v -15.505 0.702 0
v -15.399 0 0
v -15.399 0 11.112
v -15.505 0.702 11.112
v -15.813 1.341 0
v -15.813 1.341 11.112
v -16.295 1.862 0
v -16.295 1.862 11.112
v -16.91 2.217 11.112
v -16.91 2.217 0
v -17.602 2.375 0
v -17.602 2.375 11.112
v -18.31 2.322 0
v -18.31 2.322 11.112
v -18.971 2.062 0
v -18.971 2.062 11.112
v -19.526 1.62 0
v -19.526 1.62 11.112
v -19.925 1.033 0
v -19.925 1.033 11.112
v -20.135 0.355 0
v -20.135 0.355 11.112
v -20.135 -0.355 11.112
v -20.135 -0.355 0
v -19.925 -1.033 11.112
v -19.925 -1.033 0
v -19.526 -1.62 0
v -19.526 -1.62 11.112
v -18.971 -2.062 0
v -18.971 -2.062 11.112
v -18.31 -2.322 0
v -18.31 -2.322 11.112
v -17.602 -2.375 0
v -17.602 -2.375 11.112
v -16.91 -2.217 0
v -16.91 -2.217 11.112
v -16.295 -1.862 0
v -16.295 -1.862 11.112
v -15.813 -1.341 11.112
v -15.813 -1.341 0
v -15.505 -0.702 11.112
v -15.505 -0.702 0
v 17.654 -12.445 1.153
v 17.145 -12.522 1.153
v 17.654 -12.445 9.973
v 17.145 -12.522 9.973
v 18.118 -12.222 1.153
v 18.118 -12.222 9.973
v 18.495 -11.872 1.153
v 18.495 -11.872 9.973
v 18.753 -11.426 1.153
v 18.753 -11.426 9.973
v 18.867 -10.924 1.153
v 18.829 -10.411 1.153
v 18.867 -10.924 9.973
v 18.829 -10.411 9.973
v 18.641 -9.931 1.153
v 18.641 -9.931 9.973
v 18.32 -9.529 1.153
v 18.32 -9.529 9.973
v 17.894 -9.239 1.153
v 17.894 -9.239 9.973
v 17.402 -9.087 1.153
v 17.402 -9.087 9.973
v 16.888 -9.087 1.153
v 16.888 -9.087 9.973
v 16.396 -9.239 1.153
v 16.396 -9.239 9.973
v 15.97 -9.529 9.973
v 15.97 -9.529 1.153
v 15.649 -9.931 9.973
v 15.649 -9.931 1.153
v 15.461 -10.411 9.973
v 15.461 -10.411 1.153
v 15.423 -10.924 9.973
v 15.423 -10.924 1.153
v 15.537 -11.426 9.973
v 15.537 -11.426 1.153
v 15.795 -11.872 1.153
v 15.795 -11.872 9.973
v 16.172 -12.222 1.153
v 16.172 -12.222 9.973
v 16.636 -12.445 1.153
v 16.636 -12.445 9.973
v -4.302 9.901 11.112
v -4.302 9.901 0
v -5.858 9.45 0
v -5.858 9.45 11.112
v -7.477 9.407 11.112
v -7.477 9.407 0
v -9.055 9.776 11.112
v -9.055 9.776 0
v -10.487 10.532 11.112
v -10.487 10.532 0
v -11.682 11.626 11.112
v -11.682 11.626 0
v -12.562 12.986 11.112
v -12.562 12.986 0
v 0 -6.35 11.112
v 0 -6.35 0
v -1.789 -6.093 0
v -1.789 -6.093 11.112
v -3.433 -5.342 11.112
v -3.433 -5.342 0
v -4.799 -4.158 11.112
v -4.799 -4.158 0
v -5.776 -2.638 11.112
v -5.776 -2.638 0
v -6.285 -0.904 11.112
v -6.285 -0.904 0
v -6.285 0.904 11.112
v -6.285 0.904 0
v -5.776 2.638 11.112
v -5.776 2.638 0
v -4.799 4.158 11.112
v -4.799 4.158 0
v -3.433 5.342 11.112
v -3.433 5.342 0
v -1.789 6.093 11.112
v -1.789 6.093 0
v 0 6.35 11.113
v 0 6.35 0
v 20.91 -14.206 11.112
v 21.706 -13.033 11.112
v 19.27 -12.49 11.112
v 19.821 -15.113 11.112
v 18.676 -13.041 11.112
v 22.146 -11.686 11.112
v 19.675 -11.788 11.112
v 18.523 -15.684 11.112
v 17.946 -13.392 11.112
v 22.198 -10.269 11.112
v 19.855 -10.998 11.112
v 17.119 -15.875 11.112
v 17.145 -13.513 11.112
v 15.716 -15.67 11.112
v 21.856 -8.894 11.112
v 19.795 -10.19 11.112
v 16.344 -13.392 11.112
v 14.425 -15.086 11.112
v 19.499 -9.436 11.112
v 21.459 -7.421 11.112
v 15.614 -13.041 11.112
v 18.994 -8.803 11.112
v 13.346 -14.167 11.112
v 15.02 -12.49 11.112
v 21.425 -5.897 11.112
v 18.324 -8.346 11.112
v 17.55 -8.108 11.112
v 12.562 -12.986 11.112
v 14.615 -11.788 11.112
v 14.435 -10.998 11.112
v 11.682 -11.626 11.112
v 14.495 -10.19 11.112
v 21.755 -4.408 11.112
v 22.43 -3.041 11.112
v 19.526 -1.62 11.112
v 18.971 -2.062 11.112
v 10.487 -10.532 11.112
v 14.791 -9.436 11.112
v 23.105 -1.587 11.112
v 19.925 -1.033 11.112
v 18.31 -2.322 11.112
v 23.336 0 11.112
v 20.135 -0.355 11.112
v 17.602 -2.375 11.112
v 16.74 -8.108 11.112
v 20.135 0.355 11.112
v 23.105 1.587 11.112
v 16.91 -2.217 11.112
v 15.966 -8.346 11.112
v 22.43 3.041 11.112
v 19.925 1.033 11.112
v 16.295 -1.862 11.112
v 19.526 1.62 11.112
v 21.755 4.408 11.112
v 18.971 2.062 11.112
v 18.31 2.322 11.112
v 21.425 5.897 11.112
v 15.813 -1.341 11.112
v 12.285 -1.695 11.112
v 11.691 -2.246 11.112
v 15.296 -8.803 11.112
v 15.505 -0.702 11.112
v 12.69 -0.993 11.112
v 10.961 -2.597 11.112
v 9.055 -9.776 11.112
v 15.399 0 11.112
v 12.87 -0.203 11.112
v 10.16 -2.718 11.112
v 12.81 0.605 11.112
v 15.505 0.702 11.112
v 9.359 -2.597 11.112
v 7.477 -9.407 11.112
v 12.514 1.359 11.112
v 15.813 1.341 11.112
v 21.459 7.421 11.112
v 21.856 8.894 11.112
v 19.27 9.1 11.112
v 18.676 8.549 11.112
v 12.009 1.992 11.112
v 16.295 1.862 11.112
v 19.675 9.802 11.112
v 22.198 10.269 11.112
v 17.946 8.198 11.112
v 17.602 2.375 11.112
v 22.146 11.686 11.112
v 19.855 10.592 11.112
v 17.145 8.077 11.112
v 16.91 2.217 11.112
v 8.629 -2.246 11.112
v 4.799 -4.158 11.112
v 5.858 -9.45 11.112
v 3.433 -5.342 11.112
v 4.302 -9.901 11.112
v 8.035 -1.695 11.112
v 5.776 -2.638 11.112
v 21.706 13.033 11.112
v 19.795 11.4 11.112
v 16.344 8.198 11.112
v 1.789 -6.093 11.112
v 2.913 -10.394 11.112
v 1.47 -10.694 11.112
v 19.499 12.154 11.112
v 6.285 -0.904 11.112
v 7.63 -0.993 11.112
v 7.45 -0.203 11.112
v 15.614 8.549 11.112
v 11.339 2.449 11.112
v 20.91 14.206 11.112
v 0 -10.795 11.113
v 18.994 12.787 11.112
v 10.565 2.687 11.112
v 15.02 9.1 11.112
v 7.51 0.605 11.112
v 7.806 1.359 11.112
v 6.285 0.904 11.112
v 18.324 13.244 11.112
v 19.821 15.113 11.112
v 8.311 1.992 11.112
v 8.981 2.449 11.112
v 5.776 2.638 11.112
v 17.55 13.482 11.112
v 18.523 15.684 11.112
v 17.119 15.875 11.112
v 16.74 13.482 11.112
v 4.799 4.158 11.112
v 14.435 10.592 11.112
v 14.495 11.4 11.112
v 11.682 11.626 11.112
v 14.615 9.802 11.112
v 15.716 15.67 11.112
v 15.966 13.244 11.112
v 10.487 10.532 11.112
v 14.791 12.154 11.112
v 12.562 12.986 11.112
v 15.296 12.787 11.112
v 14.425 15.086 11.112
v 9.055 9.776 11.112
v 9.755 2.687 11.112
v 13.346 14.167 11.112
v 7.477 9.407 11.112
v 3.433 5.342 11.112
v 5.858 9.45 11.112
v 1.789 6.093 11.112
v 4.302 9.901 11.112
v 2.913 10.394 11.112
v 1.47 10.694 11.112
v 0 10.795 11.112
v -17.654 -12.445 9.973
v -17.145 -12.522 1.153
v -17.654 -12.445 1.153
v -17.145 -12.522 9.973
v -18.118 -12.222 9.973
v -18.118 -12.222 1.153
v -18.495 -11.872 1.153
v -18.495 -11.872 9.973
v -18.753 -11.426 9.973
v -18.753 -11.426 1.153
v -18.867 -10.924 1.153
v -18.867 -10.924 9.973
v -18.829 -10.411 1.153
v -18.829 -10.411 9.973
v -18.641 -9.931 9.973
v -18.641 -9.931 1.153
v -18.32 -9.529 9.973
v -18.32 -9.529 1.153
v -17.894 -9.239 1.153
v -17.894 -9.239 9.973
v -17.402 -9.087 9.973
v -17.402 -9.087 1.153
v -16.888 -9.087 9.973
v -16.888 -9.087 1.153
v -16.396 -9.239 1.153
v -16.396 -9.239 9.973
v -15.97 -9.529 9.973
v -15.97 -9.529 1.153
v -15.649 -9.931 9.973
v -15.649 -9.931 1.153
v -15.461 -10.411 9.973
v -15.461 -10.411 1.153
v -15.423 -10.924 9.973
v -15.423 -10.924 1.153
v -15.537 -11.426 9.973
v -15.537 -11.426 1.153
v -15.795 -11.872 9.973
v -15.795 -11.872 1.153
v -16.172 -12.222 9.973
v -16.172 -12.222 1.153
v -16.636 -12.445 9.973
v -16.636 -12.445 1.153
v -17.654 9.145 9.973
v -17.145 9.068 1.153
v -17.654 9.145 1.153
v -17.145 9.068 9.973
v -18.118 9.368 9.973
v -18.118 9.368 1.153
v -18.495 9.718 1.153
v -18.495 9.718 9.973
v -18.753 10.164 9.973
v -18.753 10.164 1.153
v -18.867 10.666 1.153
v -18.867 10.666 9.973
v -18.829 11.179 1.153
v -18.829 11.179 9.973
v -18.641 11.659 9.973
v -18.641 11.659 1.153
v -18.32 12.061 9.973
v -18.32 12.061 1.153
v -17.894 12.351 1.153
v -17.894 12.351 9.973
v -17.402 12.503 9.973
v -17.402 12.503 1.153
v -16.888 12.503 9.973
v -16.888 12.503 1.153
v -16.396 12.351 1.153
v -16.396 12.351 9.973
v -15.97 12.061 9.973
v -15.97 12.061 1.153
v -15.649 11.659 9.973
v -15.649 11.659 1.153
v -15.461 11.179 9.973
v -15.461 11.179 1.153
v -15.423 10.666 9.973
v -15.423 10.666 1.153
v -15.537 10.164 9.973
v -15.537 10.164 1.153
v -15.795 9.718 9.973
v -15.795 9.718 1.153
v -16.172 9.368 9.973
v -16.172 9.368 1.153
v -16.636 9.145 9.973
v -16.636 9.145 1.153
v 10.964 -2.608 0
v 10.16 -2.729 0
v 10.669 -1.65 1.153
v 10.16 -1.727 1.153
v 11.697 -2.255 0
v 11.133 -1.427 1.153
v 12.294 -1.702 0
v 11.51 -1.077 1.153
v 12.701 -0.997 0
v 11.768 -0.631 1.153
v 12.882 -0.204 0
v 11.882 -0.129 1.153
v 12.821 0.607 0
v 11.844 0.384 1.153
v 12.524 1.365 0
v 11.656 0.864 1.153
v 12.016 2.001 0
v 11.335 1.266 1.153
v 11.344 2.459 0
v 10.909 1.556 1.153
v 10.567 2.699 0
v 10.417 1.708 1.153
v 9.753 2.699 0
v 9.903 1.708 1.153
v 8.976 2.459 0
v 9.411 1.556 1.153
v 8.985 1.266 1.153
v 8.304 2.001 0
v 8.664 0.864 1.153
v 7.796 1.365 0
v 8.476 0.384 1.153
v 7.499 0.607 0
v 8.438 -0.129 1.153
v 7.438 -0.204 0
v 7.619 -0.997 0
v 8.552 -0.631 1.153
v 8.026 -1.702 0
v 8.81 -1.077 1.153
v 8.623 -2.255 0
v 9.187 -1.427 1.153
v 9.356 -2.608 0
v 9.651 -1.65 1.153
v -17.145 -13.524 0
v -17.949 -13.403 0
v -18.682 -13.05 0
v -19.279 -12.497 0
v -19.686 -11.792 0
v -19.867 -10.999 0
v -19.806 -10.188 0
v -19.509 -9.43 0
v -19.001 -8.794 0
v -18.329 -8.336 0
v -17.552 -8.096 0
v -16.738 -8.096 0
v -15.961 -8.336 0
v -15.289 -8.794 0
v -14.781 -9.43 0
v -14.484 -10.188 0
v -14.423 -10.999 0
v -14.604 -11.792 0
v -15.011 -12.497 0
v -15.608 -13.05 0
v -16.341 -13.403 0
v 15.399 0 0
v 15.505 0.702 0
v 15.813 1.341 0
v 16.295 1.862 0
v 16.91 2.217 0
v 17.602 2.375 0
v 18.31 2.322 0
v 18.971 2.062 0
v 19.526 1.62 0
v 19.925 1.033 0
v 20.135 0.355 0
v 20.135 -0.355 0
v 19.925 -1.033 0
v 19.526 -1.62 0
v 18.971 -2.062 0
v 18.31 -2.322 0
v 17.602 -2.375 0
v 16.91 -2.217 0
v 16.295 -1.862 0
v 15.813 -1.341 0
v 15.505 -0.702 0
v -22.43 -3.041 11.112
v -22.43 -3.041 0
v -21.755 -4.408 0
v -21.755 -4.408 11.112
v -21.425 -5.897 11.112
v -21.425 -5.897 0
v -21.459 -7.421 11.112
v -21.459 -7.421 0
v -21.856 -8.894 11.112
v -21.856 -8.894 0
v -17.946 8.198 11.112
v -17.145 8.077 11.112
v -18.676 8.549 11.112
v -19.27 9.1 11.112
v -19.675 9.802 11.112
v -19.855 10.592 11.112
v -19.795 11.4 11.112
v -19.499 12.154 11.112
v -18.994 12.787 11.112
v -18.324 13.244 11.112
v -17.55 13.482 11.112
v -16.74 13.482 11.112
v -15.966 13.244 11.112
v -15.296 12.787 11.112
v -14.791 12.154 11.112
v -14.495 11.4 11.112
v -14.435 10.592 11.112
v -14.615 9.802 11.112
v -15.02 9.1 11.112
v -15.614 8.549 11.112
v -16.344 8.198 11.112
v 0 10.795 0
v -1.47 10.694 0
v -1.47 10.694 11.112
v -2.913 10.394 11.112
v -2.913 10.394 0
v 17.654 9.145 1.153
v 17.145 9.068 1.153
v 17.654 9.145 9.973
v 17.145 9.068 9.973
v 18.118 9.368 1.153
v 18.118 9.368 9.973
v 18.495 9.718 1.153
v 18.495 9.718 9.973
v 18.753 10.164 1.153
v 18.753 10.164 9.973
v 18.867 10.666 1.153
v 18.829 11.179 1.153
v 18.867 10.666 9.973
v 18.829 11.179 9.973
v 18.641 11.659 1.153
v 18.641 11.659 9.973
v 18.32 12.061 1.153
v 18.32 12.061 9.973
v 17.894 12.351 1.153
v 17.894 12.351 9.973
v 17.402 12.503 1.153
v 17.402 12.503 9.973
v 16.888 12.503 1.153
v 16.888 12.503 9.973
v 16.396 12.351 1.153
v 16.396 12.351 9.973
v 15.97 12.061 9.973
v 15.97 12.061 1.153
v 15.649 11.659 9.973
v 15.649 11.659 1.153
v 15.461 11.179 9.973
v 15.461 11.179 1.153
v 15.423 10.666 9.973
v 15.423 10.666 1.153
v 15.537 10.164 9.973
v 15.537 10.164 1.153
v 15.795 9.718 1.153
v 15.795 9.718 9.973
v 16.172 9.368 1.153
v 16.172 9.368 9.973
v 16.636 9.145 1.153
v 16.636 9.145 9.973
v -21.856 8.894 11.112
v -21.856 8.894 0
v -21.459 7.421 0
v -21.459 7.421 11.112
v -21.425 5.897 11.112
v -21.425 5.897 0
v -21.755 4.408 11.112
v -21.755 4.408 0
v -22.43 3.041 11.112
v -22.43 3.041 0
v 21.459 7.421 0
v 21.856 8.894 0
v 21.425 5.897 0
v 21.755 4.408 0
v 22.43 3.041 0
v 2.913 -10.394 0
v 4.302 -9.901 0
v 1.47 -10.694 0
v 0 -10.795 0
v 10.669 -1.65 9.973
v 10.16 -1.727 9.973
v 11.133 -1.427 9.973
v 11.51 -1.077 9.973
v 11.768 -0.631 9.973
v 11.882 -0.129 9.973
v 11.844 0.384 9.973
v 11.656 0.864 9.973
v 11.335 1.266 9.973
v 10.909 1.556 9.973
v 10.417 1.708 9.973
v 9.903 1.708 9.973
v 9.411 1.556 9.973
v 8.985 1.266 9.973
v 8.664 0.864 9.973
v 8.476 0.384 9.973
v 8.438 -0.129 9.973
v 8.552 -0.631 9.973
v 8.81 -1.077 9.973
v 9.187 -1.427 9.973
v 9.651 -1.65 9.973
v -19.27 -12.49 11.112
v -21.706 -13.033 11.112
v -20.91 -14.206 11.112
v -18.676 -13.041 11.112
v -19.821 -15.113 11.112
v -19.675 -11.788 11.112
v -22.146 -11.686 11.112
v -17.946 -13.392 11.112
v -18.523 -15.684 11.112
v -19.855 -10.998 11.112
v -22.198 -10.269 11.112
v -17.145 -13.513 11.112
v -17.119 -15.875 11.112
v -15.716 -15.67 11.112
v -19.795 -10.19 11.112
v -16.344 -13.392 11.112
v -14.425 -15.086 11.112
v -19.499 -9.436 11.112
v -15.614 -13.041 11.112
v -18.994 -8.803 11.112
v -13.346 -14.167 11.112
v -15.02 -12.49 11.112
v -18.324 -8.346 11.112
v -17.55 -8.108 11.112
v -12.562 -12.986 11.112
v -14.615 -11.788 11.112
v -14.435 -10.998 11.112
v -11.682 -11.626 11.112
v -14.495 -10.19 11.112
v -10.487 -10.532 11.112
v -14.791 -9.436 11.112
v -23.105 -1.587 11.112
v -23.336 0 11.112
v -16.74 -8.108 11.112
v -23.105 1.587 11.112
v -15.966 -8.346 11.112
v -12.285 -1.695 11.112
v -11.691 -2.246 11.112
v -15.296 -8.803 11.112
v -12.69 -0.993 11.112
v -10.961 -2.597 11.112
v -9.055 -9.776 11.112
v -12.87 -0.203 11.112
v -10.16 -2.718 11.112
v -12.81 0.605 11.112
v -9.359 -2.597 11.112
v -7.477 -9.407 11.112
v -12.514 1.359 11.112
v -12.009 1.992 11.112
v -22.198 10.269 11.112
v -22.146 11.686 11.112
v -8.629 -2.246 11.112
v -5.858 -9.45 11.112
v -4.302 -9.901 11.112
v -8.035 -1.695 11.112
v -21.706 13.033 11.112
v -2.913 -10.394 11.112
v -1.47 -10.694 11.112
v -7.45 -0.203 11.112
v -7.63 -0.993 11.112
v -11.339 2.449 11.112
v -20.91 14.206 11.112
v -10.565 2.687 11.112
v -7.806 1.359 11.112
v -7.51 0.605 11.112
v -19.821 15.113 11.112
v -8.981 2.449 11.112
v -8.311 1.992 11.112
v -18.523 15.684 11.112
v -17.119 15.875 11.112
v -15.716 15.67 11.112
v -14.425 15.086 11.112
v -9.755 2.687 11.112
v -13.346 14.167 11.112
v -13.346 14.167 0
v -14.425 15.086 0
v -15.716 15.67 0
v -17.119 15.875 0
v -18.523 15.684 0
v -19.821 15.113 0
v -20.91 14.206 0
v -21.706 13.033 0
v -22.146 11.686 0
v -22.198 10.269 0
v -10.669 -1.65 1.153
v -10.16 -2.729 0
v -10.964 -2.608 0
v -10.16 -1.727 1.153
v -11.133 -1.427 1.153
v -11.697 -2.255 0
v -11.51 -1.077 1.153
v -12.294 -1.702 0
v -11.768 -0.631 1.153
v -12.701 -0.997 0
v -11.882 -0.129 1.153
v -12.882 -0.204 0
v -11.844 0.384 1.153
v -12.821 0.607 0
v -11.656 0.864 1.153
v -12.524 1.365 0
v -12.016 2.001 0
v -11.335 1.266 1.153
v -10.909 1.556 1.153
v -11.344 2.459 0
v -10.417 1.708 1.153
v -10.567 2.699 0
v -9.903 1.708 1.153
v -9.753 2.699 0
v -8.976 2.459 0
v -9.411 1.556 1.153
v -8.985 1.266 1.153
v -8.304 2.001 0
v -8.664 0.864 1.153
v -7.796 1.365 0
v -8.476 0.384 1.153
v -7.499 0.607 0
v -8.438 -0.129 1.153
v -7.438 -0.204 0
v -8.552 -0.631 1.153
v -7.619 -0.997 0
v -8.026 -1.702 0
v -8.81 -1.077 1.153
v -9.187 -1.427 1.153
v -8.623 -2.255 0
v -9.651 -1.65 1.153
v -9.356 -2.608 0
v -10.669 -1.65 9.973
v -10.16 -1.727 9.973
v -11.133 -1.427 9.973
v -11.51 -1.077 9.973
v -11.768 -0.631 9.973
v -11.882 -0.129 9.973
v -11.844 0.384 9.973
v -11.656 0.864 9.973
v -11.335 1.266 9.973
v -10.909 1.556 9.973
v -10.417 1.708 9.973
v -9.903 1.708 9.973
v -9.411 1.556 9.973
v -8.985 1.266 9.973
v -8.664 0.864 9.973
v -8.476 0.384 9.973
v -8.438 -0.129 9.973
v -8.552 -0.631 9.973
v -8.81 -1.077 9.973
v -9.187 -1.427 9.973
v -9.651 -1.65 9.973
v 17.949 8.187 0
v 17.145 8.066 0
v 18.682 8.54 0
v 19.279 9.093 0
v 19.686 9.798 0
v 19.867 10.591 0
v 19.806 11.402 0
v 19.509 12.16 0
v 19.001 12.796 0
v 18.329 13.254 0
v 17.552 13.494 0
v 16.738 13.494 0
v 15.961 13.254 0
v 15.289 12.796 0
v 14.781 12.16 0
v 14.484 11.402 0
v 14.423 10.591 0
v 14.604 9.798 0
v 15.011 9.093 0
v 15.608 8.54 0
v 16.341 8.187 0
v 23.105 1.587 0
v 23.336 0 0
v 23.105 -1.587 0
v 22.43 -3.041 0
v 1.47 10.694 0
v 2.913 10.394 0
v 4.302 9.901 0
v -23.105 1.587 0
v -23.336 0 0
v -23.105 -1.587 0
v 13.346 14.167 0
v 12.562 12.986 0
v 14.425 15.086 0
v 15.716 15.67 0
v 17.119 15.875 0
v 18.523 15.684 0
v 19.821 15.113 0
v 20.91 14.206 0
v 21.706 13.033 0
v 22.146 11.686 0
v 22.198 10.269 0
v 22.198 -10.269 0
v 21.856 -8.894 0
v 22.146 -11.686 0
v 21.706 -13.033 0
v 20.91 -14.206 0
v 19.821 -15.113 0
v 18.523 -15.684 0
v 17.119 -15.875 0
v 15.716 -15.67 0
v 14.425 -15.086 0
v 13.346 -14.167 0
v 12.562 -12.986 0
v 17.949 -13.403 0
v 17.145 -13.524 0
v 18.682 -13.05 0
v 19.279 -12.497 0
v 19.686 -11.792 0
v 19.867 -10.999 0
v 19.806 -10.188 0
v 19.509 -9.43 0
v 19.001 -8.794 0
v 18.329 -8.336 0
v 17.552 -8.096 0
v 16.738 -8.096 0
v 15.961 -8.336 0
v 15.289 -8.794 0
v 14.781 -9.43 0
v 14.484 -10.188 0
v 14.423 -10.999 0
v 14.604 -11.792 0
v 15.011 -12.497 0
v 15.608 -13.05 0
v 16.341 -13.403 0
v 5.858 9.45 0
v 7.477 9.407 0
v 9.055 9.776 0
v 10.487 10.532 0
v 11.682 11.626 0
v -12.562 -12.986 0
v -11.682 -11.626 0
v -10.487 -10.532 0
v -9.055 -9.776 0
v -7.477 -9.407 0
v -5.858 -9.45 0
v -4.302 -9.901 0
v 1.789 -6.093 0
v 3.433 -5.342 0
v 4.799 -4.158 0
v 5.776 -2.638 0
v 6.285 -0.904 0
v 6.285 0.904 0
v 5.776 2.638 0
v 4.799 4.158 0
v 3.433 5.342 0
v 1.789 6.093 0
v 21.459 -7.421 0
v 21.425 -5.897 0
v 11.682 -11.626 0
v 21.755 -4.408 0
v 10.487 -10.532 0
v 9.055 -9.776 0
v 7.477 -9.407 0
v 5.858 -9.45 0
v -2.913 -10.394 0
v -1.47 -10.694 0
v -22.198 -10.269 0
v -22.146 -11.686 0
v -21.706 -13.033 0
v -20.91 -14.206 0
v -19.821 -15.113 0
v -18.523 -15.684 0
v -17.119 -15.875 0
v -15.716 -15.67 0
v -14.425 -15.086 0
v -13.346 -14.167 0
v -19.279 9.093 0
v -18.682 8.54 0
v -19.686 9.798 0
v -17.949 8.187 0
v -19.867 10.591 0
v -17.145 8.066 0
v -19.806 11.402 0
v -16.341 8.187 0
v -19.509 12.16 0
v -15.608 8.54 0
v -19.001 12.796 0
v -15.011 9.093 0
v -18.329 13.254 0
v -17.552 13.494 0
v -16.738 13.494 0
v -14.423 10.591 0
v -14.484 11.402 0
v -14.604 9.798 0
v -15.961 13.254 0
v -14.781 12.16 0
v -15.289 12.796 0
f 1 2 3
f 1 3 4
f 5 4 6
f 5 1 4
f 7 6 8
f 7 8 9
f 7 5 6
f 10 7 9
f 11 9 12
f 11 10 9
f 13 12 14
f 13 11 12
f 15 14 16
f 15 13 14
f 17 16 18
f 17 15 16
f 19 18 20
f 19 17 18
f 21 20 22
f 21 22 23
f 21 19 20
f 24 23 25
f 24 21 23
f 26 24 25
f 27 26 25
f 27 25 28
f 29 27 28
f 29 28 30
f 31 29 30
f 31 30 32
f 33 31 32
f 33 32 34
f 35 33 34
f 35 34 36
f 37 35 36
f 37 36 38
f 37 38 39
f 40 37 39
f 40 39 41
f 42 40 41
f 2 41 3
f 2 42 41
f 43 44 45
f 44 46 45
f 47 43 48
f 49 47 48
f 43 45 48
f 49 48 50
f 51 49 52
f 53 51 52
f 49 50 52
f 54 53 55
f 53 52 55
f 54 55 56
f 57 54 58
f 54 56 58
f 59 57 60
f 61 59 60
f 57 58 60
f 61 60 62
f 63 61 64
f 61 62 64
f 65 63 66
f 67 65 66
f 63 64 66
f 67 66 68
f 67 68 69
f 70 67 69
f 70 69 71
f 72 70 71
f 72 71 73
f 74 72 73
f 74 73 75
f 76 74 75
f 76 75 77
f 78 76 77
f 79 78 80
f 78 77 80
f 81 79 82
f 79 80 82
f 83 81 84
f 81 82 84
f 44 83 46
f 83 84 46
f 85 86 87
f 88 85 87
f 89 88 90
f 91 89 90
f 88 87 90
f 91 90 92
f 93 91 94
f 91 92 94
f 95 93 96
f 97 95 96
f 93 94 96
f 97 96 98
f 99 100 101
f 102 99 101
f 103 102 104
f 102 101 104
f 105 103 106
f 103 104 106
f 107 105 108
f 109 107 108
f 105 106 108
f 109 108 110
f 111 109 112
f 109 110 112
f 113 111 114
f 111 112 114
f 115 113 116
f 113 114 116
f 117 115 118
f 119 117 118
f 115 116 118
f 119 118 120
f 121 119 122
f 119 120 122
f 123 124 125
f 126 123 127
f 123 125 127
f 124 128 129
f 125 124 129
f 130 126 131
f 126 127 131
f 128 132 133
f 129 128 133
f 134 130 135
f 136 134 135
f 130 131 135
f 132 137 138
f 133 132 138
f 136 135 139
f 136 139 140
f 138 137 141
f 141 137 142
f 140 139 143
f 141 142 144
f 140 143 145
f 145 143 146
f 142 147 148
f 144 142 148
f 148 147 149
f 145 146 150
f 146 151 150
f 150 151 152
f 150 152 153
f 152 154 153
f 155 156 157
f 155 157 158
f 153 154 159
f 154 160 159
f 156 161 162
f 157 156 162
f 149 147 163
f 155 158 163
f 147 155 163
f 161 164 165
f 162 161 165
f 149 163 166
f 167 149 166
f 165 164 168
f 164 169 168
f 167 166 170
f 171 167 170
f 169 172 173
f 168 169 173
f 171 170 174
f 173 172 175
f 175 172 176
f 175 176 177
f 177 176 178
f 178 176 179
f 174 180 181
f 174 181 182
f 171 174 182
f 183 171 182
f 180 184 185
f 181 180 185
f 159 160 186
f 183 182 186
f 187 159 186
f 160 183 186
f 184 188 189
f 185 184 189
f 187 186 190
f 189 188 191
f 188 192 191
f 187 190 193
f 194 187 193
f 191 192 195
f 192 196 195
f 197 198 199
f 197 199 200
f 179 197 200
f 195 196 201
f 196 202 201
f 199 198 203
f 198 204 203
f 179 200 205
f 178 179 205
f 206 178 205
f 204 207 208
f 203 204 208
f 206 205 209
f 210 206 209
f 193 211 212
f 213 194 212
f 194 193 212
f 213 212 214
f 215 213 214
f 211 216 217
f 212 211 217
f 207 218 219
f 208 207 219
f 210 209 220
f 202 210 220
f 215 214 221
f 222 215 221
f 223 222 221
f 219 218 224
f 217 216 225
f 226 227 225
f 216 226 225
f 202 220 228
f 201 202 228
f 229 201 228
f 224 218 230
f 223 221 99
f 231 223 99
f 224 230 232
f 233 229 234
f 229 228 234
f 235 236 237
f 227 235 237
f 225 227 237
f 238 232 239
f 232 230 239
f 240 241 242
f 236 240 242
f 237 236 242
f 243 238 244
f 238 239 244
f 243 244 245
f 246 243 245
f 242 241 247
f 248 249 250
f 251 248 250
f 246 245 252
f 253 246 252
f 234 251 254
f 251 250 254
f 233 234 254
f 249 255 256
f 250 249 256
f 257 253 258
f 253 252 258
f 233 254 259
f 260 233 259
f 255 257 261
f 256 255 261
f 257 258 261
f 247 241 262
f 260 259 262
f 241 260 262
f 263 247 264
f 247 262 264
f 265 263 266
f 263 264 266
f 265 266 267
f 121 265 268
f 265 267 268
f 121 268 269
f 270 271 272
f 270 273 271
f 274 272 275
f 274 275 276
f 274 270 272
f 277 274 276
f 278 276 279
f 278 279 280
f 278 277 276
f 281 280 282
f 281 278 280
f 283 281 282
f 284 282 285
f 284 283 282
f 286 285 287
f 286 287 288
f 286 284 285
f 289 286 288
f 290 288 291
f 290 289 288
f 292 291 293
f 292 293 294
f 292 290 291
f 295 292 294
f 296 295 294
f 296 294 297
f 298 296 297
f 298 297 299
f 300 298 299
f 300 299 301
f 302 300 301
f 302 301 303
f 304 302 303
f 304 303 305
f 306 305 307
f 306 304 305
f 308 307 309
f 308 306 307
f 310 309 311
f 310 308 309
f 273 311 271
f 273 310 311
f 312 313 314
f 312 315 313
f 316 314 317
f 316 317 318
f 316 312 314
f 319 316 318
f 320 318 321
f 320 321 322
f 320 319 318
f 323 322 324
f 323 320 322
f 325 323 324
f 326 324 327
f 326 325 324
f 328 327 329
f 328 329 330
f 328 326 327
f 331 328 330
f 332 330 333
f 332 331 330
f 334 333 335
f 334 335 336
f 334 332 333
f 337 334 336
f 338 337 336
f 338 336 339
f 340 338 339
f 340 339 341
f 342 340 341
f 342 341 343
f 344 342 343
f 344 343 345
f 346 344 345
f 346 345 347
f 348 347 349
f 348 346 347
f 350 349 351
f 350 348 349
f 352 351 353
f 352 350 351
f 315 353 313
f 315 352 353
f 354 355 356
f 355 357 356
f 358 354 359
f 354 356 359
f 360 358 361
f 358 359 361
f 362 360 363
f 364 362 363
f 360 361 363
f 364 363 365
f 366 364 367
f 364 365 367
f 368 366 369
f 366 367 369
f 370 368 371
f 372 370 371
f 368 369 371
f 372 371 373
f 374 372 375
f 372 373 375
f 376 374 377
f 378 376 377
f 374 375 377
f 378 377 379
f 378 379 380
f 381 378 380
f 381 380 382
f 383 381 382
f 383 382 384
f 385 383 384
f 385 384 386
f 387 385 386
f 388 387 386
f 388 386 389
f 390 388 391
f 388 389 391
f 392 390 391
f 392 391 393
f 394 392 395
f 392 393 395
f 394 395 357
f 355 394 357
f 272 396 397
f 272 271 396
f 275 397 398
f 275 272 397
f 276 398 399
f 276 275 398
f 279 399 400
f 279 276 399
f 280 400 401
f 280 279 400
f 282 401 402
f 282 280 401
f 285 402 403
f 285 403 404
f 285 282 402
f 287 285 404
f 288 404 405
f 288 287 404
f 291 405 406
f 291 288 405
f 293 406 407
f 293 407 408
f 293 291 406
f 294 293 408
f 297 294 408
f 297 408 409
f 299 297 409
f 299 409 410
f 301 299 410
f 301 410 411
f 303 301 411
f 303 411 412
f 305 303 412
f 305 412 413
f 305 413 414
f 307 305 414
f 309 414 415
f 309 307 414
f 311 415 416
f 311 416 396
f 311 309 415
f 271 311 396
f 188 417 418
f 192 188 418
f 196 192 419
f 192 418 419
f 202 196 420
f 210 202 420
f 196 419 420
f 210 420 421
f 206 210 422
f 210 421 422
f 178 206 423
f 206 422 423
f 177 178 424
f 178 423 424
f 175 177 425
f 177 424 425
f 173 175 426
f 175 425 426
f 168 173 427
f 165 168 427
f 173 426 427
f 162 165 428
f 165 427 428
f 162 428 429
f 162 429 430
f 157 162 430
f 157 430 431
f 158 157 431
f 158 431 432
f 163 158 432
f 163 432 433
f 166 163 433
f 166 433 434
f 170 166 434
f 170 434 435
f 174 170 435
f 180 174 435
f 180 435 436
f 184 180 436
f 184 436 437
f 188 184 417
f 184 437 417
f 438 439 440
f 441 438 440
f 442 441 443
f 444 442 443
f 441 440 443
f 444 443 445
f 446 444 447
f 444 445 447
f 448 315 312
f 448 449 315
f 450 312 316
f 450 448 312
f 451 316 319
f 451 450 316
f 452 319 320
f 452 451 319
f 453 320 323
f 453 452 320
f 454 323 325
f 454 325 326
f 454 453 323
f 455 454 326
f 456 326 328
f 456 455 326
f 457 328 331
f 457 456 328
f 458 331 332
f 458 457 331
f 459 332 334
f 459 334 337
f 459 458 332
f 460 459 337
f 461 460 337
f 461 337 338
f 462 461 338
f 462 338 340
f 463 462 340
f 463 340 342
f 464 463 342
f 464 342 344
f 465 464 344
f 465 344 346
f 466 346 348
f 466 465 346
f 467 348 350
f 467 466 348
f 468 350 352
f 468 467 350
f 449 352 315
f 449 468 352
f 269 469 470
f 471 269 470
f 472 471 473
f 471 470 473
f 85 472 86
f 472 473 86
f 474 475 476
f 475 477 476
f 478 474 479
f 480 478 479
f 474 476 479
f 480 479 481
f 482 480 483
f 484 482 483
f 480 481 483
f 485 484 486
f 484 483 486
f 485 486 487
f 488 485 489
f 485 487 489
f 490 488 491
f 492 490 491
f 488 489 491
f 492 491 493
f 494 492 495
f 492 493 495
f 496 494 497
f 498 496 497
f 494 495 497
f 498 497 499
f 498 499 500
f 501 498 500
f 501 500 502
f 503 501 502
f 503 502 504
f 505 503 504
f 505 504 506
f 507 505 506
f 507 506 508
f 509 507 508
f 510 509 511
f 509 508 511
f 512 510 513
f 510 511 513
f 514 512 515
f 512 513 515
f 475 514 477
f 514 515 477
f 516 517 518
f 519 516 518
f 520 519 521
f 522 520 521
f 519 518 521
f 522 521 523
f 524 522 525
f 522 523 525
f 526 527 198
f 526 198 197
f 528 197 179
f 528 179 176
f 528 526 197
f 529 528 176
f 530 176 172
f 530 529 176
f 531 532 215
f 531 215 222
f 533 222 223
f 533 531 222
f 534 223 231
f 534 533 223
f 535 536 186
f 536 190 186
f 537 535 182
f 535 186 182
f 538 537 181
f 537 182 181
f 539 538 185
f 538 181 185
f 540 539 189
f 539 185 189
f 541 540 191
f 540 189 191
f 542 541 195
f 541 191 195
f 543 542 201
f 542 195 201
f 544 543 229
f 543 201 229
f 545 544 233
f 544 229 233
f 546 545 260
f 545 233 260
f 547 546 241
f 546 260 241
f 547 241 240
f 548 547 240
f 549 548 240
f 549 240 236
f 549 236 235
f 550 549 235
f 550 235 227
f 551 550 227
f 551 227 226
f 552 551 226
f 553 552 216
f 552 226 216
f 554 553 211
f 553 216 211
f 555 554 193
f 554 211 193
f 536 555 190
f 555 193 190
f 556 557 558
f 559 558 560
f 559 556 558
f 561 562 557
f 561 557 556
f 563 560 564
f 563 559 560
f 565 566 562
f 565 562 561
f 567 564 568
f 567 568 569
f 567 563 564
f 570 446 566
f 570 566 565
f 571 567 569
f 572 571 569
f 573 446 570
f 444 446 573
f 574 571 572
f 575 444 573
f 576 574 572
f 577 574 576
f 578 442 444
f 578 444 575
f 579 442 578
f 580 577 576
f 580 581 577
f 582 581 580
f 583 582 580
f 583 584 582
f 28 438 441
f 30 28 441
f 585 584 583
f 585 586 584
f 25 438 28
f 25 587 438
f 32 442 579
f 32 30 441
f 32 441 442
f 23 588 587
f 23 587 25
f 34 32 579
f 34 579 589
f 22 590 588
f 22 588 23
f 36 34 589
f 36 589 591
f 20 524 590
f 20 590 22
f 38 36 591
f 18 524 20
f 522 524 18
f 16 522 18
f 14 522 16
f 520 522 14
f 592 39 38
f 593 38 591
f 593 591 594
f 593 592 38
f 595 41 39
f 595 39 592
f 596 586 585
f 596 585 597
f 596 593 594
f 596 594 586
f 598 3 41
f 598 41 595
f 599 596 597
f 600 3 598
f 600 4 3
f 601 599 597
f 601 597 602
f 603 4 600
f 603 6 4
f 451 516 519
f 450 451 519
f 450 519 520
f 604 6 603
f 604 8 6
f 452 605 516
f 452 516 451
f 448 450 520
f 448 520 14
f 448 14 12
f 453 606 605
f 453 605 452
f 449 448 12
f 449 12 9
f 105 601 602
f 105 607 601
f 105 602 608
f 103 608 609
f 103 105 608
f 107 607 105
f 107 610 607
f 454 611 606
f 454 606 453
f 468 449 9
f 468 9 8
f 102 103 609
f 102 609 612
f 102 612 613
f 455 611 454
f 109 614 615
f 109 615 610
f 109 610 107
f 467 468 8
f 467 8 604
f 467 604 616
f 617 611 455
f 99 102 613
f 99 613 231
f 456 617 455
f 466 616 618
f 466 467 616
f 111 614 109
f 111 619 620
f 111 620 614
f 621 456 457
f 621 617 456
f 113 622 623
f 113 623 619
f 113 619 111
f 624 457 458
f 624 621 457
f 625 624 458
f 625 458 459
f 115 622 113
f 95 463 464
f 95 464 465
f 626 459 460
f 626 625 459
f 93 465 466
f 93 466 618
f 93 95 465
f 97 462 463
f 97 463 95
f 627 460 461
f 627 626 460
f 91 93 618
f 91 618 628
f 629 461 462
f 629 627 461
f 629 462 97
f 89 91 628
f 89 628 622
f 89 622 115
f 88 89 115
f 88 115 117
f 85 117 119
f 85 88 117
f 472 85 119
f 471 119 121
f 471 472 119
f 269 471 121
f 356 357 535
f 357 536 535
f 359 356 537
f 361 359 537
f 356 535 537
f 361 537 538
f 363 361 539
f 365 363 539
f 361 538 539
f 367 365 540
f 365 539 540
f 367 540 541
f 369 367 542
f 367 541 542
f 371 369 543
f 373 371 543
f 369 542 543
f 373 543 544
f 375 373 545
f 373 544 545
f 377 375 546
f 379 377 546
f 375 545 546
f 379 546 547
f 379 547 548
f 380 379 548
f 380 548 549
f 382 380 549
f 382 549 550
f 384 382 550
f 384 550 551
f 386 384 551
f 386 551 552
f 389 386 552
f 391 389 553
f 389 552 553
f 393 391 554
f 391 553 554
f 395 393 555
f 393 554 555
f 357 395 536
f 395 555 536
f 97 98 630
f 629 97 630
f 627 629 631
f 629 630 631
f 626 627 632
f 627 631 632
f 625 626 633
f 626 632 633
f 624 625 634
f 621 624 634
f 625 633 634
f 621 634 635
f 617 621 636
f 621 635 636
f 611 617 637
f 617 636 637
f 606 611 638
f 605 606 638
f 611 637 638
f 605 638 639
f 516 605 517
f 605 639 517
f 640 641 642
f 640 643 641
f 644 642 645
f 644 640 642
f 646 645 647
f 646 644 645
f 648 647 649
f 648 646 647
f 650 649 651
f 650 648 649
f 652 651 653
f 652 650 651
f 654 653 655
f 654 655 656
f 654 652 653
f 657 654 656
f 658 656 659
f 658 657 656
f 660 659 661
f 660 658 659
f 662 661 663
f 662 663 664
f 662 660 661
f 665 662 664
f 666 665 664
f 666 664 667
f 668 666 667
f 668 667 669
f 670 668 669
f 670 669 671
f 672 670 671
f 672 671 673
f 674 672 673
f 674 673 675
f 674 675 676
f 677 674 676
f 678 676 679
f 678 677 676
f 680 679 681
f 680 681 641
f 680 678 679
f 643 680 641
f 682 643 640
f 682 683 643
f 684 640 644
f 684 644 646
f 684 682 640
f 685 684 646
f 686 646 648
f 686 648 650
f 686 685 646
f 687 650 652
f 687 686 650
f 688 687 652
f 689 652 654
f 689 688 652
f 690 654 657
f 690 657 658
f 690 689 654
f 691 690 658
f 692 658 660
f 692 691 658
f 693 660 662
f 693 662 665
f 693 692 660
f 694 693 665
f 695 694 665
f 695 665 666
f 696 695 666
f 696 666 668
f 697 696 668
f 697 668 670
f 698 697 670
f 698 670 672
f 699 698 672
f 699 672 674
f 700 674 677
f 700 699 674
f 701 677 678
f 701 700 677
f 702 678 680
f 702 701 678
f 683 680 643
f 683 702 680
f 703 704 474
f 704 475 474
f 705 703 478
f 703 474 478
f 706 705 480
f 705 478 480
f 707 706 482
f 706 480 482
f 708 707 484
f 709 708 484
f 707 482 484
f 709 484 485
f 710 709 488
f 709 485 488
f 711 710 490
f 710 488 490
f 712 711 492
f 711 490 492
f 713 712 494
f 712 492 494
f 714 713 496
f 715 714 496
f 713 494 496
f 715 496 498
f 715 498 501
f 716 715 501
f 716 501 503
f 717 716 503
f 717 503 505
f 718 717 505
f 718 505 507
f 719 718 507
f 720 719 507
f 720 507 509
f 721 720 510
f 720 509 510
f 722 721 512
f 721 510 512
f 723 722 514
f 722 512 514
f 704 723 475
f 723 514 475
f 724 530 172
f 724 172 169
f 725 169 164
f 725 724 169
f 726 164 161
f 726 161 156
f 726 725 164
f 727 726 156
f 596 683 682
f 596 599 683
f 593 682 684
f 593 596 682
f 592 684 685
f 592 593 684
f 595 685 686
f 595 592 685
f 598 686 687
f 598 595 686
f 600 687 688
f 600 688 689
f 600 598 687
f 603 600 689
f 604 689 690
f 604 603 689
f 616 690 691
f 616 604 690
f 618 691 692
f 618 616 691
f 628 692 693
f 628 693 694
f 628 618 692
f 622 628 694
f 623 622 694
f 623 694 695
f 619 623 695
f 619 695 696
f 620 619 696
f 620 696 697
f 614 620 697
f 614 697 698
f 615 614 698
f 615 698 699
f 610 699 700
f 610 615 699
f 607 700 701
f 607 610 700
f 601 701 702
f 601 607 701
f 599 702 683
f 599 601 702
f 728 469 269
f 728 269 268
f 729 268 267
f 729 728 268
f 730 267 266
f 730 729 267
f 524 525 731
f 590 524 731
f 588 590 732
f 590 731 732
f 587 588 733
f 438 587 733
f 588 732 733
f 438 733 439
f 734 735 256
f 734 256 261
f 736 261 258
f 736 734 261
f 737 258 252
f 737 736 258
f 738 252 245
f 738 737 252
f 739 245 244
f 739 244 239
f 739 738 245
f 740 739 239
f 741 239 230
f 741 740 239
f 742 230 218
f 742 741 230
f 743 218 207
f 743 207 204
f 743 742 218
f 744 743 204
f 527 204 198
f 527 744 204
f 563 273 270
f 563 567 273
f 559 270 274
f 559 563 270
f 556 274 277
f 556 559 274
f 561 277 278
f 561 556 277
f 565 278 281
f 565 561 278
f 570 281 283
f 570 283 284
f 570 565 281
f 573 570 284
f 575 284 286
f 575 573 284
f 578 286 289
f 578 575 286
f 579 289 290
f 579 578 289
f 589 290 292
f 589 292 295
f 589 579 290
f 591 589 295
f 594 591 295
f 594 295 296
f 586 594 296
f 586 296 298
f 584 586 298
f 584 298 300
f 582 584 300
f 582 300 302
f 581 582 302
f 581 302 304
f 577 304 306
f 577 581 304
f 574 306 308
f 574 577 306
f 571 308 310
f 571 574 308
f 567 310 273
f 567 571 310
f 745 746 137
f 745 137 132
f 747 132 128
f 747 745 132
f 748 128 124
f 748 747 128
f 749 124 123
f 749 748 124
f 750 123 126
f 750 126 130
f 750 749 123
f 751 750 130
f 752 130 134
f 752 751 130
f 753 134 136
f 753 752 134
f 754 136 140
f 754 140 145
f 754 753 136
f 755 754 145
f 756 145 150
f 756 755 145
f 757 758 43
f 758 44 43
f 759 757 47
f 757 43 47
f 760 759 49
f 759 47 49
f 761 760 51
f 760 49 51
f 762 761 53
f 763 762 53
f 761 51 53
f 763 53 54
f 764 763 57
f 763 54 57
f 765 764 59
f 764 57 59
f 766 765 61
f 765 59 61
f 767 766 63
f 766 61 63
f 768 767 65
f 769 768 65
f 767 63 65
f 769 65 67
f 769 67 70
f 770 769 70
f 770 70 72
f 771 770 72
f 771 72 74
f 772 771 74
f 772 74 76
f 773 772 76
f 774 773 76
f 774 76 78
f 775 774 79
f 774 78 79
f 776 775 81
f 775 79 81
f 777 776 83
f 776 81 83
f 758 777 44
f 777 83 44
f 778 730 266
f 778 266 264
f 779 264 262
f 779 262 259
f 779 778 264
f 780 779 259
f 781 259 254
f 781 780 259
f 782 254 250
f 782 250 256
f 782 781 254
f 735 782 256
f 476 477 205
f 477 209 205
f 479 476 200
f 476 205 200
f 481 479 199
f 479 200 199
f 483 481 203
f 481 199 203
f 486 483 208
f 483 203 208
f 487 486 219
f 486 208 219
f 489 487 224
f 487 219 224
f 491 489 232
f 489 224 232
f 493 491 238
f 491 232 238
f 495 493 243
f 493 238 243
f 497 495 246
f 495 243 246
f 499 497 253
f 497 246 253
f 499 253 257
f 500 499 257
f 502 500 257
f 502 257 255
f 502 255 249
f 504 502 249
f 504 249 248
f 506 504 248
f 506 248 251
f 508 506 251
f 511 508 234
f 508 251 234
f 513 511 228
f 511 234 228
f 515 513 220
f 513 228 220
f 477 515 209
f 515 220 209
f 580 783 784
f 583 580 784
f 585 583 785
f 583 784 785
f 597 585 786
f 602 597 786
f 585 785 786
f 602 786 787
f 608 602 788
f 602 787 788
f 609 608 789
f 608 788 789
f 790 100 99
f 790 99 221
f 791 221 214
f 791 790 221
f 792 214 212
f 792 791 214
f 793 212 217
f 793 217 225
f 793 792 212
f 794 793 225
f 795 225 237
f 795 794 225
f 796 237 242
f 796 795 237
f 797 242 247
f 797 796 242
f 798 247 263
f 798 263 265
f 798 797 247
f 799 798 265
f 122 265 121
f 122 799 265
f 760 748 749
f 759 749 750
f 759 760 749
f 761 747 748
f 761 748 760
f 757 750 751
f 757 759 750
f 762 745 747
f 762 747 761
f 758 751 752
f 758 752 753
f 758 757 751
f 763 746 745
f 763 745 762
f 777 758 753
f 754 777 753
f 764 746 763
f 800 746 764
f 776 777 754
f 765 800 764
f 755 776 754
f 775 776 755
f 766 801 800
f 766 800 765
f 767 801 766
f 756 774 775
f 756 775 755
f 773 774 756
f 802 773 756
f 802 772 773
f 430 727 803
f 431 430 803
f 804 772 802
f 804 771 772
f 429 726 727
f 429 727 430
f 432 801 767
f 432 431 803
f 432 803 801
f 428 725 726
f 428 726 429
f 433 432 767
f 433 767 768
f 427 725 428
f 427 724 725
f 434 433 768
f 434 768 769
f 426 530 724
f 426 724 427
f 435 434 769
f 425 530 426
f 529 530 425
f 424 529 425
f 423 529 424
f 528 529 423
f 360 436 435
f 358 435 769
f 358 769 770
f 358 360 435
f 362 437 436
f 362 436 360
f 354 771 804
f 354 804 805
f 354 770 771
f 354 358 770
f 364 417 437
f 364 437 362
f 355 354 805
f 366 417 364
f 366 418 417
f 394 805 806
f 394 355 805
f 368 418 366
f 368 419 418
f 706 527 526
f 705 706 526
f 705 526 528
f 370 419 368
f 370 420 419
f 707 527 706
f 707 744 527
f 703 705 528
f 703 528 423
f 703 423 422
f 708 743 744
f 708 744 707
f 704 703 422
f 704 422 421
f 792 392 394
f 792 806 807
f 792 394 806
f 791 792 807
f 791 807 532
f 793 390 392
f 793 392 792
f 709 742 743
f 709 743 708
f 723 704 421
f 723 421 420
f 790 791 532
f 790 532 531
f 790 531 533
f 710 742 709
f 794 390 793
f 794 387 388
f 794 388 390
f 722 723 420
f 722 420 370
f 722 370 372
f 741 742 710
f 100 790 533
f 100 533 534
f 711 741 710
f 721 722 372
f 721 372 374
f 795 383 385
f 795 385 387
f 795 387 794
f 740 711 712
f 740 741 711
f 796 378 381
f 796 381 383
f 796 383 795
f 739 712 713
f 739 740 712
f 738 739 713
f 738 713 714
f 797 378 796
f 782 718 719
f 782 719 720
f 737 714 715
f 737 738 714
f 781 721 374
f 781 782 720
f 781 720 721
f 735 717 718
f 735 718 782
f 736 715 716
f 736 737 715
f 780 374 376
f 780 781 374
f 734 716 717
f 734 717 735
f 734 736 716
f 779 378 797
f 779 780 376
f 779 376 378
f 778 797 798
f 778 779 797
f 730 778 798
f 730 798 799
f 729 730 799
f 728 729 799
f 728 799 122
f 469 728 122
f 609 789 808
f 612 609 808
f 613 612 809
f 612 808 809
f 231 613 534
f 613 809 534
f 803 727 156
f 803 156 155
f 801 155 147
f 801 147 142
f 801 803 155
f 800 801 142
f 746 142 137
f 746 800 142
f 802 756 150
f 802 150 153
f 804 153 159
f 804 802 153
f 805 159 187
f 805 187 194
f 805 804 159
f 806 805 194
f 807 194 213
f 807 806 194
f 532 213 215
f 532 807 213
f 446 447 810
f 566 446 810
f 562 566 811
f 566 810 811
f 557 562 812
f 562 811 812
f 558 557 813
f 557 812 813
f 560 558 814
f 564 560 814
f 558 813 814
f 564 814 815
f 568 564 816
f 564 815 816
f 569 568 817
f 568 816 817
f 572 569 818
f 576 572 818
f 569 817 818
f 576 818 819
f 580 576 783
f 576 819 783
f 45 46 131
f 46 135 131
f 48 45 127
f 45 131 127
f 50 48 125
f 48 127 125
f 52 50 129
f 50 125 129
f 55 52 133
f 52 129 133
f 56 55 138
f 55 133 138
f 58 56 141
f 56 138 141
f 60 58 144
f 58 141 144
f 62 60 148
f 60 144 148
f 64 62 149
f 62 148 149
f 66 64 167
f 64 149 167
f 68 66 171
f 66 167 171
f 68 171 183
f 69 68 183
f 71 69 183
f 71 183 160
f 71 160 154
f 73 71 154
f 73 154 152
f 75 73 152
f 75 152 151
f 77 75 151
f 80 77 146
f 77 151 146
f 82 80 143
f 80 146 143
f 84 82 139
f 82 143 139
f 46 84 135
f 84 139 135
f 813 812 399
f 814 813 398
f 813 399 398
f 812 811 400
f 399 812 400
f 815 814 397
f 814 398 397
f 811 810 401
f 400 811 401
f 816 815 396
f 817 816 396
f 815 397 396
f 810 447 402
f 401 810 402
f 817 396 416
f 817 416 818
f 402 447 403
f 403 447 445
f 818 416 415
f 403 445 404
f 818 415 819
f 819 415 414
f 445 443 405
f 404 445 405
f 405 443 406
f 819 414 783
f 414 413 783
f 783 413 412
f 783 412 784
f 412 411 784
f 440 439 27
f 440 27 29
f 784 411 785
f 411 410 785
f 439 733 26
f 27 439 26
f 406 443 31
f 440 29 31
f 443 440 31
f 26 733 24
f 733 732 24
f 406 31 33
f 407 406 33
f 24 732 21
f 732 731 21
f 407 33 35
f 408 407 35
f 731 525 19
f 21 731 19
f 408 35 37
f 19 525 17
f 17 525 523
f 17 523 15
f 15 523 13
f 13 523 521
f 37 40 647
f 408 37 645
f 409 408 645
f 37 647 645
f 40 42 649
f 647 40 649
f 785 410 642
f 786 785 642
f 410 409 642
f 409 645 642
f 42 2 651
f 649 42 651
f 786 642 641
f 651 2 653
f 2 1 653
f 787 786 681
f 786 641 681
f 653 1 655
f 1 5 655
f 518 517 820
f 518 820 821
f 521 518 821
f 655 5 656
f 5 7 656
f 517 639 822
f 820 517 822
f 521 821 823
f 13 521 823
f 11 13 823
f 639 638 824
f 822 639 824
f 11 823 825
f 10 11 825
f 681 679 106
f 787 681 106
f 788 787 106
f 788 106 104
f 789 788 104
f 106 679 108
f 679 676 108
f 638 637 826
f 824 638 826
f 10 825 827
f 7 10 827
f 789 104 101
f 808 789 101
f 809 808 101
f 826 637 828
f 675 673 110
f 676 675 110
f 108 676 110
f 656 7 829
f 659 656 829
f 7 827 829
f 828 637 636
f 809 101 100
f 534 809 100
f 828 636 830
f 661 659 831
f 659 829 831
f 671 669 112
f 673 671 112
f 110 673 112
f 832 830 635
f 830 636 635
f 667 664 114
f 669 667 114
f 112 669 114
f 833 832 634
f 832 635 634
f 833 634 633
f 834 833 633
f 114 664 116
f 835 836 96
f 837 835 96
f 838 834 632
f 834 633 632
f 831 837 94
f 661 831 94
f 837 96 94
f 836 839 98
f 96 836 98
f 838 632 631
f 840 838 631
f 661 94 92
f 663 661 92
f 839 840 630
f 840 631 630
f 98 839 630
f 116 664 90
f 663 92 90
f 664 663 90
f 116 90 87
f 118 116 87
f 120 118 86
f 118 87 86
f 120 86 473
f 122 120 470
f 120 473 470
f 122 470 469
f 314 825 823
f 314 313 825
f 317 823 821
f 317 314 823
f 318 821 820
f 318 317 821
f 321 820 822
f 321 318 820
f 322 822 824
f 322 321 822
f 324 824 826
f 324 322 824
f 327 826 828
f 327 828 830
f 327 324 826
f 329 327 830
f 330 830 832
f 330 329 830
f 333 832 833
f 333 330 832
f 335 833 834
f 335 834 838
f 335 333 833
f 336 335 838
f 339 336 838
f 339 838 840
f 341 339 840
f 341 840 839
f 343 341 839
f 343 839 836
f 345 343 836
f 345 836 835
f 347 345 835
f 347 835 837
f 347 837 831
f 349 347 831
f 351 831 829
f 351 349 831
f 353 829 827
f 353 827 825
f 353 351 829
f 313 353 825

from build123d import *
from build123d.topology import SkipClean

# Parameters (mm, degrees)
SKETCH1_R                      = 2.38125
BOSS_EXTRUDE1_DEPTH            = 11.1125
F_8_32_TAPPED_HOLE1_AT_2_COUNT = 2
F_8_32_TAPPED_HOLE1_AT_2_PITCH = 12.857770024
F_8_32_TAPPED_HOLE1_AT_3_COUNT = 2
F_8_32_TAPPED_HOLE1_AT_3_PITCH = 12.857770024


with BuildPart() as part:
    # Sketch1 → Boss-Extrude1 (new body)
    with BuildSketch(Plane.XY):
        with BuildLine():
            ThreePointArc((0, -6.35), (-6.35, 0), (0, 6.35))
            Line((0, 6.35), (0, 10.795))
            ThreePointArc((0, 10.795), (-2.197021558, 10.569064352), (-4.302077301, 9.900714918))
            ThreePointArc((-4.302077301, 9.900714918), (-9.054681629, 9.776106511), (-12.561760448, 12.985962165))
            ThreePointArc((-12.561760448, 12.985962165), (-19.192123591, 15.444267147), (-21.855781895, 8.89370204))
            ThreePointArc((-21.855781895, 8.89370204), (-21.424604414, 5.897029127), (-22.429987657, 3.041303808))
            ThreePointArc((-22.429987657, 3.041303808), (-23.33625, 0), (-22.429987657, -3.041303808))
            ThreePointArc((-22.429987657, -3.041303808), (-21.424604414, -5.897029127), (-21.855781895, -8.89370204))
            ThreePointArc((-21.855781895, -8.89370204), (-19.192123591, -15.444267147), (-12.561760448, -12.985962165))
            ThreePointArc((-12.561760448, -12.985962165), (-9.054681629, -9.776106511), (-4.302077301, -9.900714918))
            ThreePointArc((-4.302077301, -9.900714918), (-2.197021558, -10.569064352), (0, -10.795))
            Line((0, -10.795), (0, -6.35))
        make_face()
        with Locations((-17.78, 0)):
            Circle(SKETCH1_R, mode=Mode.SUBTRACT)
    extrude(amount=BOSS_EXTRUDE1_DEPTH)

    # Sketch2 → #8-32 Tapped Hole1 (revolve, cut)
    with BuildSketch(Plane(origin=(-10.16, 0, 11.1125), x_dir=(0, -1, 0), z_dir=(1, 0, 0))):
        Polygon((0, 0), (0, 11.1125), (2.72923, 11.1125), (1.7272, 9.959796345), (1.7272, 1.139554944), (2.7178, 0), align=None)
    f_8_32_tapped_hole1 = revolve(axis=Axis((-10.16, 0, 17.4625), (0, 0, -1)), mode=Mode.SUBTRACT)

    # #8-32 Tapped Hole1 at 2: #8-32 Tapped Hole1 ×2
    with Locations(*[Vector(-0.5432512781572743, 0.8395701571521511, 0) * (i * F_8_32_TAPPED_HOLE1_AT_2_PITCH) for i in range(1, F_8_32_TAPPED_HOLE1_AT_2_COUNT)]):
        add(f_8_32_tapped_hole1, mode=Mode.SUBTRACT)

    # #8-32 Tapped Hole1 at 3: #8-32 Tapped Hole1 ×2
    with Locations(*[Vector(-0.5432512781572741, -0.8395701571521512, 0) * (i * F_8_32_TAPPED_HOLE1_AT_3_PITCH) for i in range(1, F_8_32_TAPPED_HOLE1_AT_3_COUNT)]):
        add(f_8_32_tapped_hole1, mode=Mode.SUBTRACT)

    # Mirror2: part across plane


with BuildPart() as part_1:
    with SkipClean():  # the faces are left unmerged after this step: merging them gives an invalid solid
        add(part.part)
        add(part.part.mirror(Plane(origin=(0, 6.35, 11.1125), x_dir=(0, 0, 1), z_dir=(-1, 0, 0))))


solid = part_1.part
